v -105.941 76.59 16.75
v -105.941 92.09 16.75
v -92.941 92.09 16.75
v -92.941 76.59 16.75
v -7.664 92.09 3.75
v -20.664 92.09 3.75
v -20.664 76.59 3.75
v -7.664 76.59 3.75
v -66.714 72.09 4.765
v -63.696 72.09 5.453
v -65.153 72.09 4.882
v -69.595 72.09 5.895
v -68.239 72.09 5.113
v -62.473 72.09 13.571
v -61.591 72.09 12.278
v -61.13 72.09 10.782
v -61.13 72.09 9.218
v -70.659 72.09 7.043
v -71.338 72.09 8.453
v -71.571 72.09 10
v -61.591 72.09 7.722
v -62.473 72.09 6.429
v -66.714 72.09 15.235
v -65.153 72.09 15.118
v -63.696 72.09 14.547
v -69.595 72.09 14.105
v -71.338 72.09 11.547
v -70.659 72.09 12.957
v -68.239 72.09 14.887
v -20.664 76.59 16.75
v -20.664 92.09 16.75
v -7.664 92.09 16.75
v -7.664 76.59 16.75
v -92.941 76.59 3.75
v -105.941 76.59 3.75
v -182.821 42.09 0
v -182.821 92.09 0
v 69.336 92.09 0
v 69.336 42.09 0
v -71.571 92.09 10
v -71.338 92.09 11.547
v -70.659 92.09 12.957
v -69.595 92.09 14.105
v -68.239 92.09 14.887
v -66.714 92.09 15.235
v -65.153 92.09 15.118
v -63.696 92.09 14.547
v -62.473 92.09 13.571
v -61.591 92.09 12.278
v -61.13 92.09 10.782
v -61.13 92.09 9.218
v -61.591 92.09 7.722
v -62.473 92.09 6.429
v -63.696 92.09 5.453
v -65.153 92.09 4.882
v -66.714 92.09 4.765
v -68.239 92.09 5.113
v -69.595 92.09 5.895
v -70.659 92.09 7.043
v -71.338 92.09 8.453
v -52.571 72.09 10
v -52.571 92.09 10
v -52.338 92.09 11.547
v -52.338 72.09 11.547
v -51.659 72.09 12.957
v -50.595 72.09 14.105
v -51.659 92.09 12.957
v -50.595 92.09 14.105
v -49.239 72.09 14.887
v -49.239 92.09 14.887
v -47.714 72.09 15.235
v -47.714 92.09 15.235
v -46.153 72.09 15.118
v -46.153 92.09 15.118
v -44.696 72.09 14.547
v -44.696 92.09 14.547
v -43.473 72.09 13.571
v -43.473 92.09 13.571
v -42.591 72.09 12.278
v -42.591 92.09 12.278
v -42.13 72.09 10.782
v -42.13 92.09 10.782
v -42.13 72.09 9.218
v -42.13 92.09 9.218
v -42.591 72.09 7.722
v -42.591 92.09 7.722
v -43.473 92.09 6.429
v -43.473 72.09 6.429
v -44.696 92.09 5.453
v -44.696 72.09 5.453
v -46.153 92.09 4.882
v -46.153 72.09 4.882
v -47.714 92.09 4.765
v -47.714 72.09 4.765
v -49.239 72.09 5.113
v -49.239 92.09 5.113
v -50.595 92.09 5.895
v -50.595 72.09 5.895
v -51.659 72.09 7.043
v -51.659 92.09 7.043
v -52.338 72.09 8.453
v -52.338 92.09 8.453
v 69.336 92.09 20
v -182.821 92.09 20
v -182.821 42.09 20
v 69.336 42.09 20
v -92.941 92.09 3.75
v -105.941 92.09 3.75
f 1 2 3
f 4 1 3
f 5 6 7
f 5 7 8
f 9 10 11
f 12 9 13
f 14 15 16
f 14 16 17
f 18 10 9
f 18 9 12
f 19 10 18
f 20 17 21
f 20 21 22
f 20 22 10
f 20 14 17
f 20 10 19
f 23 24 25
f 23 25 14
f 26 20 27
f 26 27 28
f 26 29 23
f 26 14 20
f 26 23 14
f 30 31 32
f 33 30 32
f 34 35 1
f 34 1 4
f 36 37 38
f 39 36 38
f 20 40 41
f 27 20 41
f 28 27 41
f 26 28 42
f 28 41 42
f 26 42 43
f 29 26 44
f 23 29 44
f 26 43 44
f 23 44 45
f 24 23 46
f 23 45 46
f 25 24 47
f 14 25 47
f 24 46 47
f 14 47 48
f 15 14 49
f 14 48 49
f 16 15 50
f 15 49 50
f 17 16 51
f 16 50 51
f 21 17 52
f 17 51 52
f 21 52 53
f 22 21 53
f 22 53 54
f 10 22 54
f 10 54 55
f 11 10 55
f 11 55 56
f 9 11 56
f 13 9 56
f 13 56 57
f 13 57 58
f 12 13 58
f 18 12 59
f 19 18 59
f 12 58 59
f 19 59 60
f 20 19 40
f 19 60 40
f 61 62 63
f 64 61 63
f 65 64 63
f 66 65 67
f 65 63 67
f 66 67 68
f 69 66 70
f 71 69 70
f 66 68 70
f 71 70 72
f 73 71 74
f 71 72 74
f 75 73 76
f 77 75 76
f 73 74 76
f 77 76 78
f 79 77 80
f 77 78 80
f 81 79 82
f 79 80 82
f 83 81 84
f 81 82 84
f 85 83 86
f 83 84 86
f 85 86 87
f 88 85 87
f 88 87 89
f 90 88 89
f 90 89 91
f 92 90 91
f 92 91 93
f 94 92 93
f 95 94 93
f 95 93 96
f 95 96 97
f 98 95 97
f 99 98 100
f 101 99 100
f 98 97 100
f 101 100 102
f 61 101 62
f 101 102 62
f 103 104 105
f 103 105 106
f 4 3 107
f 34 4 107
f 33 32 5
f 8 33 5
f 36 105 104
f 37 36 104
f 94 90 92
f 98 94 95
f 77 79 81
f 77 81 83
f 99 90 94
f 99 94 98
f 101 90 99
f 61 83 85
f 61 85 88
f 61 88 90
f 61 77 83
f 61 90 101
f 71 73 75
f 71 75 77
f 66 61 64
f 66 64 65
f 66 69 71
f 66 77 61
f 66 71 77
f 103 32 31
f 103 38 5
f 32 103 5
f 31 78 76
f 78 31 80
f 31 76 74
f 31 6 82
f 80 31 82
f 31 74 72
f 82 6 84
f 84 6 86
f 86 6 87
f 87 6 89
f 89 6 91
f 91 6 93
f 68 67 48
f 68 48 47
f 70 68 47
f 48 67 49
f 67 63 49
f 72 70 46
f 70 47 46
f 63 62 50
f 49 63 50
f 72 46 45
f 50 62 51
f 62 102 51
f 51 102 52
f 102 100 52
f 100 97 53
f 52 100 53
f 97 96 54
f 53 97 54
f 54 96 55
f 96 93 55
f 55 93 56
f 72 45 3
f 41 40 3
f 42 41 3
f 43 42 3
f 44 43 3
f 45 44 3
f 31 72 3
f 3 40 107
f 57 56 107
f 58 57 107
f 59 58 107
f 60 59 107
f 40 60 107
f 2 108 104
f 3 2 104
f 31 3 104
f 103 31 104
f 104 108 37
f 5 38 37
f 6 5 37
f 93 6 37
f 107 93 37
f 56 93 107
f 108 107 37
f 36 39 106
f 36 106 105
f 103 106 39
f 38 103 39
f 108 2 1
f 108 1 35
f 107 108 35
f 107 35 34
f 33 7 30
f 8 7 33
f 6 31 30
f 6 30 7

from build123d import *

# Parameters (mm, degrees)
BOSS_EXTRUDE1_DEPTH = 20
SKETCH5_R           = 5.25
CUT_EXTRUDE4_DEPTH  = 20
SKETCH6_W           = 13
SKETCH6_H           = 13
CUT_EXTRUDE5_DEPTH  = 15.5
SKETCH7_W           = 13
SKETCH7_H           = 13
CUT_EXTRUDE6_DEPTH  = 15.5
SKETCH8_W           = 300
SKETCH8_H           = 102
BOSS_EXTRUDE2_DEPTH = 20
CUT_EXTRUDE7_START  = -150
SKETCH9_W           = 47.842391085
SKETCH9_H           = 20
CUT_EXTRUDE7_DEPTH  = 150
SKETCH10_W          = 252.157608915
SKETCH10_H          = 50
CUT_EXTRUDE8_DEPTH  = 310
SKETCH11_W          = 252.157608915
SKETCH11_H          = 50
CUT_EXTRUDE9_DEPTH  = 20


with BuildPart() as part:
    # Sketch1 → Boss-Extrude1 (new body)
    with BuildSketch(Plane.XY):
        Polygon((-107.821386225, 92.09039548), (-7.821386225, 92.09039548), (117.178613775, 92.09039548), (117.178613775, 44.09039548), (-7.821386225, 44.09039548), (-107.821386225, 44.09039548), (-182.821386225, 44.09039548), (-182.821386225, 92.09039548), align=None)
    extrude(amount=BOSS_EXTRUDE1_DEPTH)

    # Sketch5 → Cut-Extrude4 (cut)
    with BuildSketch(Plane(origin=(0, 92.09039548, 0), x_dir=(1, 0, 0), z_dir=(0, 1, 0))):
        with Locations(Location((-66.321386225, -10, 0), (0, 0, 180))):
            Circle(SKETCH5_R)
        with Locations(Location((-47.321386225, -10, 0), (0, 0, 180))):
            Circle(SKETCH5_R)
    extrude(amount=-CUT_EXTRUDE4_DEPTH, mode=Mode.SUBTRACT)

    # Sketch6 → Cut-Extrude5 (cut)
    with BuildSketch(Plane(origin=(0, 92.09039548, 0), x_dir=(1, 0, 0), z_dir=(0, 1, 0))):
        with Locations((-99.441386225, -10.25)):
            Rectangle(SKETCH6_W, SKETCH6_H)
    extrude(amount=-CUT_EXTRUDE5_DEPTH, mode=Mode.SUBTRACT)

    # Sketch7 → Cut-Extrude6 (cut)
    with BuildSketch(Plane(origin=(0, 92.09039548, 0), x_dir=(1, 0, 0), z_dir=(0, 1, 0))):
        with Locations((-14.16377731, -10.25)):
            Rectangle(SKETCH7_W, SKETCH7_H)
    extrude(amount=-CUT_EXTRUDE6_DEPTH, mode=Mode.SUBTRACT)

    # Sketch8 → Boss-Extrude2 (add)
    with BuildSketch(Plane.XY.offset(20)):
        with Locations((-32.821386225, -6.90960452)):
            Rectangle(SKETCH8_W, SKETCH8_H)
    extrude(amount=-BOSS_EXTRUDE2_DEPTH)

    # Sketch9 → Cut-Extrude7 (cut)
    with BuildSketch(Plane(origin=(0, 92.09039548, 0), x_dir=(1, 0, 0), z_dir=(0, 1, 0)).offset(CUT_EXTRUDE7_START)):
        with Locations((93.257418233, -10)):
            Rectangle(SKETCH9_W, SKETCH9_H)
    extrude(amount=CUT_EXTRUDE7_DEPTH, mode=Mode.SUBTRACT)

    # Sketch10 → Cut-Extrude8 (cut)
    with BuildSketch(Plane(origin=(0, 0, 0), x_dir=(-1, 0, 0), z_dir=(0, 0, -1))):
        with Locations((56.742581767, -32.90960452)):
            Rectangle(SKETCH10_W, SKETCH10_H)
    extrude(amount=-CUT_EXTRUDE8_DEPTH, mode=Mode.SUBTRACT)

    # Sketch11 → Cut-Extrude9 (cut)
    with BuildSketch(Plane(origin=(0, 0, 0), x_dir=(-1, 0, 0), z_dir=(0, 0, -1))):
        with Locations((56.742581767, 17.09039548)):
            Rectangle(SKETCH11_W, SKETCH11_H)
    extrude(amount=-CUT_EXTRUDE9_DEPTH, mode=Mode.SUBTRACT)


solid = part.part
